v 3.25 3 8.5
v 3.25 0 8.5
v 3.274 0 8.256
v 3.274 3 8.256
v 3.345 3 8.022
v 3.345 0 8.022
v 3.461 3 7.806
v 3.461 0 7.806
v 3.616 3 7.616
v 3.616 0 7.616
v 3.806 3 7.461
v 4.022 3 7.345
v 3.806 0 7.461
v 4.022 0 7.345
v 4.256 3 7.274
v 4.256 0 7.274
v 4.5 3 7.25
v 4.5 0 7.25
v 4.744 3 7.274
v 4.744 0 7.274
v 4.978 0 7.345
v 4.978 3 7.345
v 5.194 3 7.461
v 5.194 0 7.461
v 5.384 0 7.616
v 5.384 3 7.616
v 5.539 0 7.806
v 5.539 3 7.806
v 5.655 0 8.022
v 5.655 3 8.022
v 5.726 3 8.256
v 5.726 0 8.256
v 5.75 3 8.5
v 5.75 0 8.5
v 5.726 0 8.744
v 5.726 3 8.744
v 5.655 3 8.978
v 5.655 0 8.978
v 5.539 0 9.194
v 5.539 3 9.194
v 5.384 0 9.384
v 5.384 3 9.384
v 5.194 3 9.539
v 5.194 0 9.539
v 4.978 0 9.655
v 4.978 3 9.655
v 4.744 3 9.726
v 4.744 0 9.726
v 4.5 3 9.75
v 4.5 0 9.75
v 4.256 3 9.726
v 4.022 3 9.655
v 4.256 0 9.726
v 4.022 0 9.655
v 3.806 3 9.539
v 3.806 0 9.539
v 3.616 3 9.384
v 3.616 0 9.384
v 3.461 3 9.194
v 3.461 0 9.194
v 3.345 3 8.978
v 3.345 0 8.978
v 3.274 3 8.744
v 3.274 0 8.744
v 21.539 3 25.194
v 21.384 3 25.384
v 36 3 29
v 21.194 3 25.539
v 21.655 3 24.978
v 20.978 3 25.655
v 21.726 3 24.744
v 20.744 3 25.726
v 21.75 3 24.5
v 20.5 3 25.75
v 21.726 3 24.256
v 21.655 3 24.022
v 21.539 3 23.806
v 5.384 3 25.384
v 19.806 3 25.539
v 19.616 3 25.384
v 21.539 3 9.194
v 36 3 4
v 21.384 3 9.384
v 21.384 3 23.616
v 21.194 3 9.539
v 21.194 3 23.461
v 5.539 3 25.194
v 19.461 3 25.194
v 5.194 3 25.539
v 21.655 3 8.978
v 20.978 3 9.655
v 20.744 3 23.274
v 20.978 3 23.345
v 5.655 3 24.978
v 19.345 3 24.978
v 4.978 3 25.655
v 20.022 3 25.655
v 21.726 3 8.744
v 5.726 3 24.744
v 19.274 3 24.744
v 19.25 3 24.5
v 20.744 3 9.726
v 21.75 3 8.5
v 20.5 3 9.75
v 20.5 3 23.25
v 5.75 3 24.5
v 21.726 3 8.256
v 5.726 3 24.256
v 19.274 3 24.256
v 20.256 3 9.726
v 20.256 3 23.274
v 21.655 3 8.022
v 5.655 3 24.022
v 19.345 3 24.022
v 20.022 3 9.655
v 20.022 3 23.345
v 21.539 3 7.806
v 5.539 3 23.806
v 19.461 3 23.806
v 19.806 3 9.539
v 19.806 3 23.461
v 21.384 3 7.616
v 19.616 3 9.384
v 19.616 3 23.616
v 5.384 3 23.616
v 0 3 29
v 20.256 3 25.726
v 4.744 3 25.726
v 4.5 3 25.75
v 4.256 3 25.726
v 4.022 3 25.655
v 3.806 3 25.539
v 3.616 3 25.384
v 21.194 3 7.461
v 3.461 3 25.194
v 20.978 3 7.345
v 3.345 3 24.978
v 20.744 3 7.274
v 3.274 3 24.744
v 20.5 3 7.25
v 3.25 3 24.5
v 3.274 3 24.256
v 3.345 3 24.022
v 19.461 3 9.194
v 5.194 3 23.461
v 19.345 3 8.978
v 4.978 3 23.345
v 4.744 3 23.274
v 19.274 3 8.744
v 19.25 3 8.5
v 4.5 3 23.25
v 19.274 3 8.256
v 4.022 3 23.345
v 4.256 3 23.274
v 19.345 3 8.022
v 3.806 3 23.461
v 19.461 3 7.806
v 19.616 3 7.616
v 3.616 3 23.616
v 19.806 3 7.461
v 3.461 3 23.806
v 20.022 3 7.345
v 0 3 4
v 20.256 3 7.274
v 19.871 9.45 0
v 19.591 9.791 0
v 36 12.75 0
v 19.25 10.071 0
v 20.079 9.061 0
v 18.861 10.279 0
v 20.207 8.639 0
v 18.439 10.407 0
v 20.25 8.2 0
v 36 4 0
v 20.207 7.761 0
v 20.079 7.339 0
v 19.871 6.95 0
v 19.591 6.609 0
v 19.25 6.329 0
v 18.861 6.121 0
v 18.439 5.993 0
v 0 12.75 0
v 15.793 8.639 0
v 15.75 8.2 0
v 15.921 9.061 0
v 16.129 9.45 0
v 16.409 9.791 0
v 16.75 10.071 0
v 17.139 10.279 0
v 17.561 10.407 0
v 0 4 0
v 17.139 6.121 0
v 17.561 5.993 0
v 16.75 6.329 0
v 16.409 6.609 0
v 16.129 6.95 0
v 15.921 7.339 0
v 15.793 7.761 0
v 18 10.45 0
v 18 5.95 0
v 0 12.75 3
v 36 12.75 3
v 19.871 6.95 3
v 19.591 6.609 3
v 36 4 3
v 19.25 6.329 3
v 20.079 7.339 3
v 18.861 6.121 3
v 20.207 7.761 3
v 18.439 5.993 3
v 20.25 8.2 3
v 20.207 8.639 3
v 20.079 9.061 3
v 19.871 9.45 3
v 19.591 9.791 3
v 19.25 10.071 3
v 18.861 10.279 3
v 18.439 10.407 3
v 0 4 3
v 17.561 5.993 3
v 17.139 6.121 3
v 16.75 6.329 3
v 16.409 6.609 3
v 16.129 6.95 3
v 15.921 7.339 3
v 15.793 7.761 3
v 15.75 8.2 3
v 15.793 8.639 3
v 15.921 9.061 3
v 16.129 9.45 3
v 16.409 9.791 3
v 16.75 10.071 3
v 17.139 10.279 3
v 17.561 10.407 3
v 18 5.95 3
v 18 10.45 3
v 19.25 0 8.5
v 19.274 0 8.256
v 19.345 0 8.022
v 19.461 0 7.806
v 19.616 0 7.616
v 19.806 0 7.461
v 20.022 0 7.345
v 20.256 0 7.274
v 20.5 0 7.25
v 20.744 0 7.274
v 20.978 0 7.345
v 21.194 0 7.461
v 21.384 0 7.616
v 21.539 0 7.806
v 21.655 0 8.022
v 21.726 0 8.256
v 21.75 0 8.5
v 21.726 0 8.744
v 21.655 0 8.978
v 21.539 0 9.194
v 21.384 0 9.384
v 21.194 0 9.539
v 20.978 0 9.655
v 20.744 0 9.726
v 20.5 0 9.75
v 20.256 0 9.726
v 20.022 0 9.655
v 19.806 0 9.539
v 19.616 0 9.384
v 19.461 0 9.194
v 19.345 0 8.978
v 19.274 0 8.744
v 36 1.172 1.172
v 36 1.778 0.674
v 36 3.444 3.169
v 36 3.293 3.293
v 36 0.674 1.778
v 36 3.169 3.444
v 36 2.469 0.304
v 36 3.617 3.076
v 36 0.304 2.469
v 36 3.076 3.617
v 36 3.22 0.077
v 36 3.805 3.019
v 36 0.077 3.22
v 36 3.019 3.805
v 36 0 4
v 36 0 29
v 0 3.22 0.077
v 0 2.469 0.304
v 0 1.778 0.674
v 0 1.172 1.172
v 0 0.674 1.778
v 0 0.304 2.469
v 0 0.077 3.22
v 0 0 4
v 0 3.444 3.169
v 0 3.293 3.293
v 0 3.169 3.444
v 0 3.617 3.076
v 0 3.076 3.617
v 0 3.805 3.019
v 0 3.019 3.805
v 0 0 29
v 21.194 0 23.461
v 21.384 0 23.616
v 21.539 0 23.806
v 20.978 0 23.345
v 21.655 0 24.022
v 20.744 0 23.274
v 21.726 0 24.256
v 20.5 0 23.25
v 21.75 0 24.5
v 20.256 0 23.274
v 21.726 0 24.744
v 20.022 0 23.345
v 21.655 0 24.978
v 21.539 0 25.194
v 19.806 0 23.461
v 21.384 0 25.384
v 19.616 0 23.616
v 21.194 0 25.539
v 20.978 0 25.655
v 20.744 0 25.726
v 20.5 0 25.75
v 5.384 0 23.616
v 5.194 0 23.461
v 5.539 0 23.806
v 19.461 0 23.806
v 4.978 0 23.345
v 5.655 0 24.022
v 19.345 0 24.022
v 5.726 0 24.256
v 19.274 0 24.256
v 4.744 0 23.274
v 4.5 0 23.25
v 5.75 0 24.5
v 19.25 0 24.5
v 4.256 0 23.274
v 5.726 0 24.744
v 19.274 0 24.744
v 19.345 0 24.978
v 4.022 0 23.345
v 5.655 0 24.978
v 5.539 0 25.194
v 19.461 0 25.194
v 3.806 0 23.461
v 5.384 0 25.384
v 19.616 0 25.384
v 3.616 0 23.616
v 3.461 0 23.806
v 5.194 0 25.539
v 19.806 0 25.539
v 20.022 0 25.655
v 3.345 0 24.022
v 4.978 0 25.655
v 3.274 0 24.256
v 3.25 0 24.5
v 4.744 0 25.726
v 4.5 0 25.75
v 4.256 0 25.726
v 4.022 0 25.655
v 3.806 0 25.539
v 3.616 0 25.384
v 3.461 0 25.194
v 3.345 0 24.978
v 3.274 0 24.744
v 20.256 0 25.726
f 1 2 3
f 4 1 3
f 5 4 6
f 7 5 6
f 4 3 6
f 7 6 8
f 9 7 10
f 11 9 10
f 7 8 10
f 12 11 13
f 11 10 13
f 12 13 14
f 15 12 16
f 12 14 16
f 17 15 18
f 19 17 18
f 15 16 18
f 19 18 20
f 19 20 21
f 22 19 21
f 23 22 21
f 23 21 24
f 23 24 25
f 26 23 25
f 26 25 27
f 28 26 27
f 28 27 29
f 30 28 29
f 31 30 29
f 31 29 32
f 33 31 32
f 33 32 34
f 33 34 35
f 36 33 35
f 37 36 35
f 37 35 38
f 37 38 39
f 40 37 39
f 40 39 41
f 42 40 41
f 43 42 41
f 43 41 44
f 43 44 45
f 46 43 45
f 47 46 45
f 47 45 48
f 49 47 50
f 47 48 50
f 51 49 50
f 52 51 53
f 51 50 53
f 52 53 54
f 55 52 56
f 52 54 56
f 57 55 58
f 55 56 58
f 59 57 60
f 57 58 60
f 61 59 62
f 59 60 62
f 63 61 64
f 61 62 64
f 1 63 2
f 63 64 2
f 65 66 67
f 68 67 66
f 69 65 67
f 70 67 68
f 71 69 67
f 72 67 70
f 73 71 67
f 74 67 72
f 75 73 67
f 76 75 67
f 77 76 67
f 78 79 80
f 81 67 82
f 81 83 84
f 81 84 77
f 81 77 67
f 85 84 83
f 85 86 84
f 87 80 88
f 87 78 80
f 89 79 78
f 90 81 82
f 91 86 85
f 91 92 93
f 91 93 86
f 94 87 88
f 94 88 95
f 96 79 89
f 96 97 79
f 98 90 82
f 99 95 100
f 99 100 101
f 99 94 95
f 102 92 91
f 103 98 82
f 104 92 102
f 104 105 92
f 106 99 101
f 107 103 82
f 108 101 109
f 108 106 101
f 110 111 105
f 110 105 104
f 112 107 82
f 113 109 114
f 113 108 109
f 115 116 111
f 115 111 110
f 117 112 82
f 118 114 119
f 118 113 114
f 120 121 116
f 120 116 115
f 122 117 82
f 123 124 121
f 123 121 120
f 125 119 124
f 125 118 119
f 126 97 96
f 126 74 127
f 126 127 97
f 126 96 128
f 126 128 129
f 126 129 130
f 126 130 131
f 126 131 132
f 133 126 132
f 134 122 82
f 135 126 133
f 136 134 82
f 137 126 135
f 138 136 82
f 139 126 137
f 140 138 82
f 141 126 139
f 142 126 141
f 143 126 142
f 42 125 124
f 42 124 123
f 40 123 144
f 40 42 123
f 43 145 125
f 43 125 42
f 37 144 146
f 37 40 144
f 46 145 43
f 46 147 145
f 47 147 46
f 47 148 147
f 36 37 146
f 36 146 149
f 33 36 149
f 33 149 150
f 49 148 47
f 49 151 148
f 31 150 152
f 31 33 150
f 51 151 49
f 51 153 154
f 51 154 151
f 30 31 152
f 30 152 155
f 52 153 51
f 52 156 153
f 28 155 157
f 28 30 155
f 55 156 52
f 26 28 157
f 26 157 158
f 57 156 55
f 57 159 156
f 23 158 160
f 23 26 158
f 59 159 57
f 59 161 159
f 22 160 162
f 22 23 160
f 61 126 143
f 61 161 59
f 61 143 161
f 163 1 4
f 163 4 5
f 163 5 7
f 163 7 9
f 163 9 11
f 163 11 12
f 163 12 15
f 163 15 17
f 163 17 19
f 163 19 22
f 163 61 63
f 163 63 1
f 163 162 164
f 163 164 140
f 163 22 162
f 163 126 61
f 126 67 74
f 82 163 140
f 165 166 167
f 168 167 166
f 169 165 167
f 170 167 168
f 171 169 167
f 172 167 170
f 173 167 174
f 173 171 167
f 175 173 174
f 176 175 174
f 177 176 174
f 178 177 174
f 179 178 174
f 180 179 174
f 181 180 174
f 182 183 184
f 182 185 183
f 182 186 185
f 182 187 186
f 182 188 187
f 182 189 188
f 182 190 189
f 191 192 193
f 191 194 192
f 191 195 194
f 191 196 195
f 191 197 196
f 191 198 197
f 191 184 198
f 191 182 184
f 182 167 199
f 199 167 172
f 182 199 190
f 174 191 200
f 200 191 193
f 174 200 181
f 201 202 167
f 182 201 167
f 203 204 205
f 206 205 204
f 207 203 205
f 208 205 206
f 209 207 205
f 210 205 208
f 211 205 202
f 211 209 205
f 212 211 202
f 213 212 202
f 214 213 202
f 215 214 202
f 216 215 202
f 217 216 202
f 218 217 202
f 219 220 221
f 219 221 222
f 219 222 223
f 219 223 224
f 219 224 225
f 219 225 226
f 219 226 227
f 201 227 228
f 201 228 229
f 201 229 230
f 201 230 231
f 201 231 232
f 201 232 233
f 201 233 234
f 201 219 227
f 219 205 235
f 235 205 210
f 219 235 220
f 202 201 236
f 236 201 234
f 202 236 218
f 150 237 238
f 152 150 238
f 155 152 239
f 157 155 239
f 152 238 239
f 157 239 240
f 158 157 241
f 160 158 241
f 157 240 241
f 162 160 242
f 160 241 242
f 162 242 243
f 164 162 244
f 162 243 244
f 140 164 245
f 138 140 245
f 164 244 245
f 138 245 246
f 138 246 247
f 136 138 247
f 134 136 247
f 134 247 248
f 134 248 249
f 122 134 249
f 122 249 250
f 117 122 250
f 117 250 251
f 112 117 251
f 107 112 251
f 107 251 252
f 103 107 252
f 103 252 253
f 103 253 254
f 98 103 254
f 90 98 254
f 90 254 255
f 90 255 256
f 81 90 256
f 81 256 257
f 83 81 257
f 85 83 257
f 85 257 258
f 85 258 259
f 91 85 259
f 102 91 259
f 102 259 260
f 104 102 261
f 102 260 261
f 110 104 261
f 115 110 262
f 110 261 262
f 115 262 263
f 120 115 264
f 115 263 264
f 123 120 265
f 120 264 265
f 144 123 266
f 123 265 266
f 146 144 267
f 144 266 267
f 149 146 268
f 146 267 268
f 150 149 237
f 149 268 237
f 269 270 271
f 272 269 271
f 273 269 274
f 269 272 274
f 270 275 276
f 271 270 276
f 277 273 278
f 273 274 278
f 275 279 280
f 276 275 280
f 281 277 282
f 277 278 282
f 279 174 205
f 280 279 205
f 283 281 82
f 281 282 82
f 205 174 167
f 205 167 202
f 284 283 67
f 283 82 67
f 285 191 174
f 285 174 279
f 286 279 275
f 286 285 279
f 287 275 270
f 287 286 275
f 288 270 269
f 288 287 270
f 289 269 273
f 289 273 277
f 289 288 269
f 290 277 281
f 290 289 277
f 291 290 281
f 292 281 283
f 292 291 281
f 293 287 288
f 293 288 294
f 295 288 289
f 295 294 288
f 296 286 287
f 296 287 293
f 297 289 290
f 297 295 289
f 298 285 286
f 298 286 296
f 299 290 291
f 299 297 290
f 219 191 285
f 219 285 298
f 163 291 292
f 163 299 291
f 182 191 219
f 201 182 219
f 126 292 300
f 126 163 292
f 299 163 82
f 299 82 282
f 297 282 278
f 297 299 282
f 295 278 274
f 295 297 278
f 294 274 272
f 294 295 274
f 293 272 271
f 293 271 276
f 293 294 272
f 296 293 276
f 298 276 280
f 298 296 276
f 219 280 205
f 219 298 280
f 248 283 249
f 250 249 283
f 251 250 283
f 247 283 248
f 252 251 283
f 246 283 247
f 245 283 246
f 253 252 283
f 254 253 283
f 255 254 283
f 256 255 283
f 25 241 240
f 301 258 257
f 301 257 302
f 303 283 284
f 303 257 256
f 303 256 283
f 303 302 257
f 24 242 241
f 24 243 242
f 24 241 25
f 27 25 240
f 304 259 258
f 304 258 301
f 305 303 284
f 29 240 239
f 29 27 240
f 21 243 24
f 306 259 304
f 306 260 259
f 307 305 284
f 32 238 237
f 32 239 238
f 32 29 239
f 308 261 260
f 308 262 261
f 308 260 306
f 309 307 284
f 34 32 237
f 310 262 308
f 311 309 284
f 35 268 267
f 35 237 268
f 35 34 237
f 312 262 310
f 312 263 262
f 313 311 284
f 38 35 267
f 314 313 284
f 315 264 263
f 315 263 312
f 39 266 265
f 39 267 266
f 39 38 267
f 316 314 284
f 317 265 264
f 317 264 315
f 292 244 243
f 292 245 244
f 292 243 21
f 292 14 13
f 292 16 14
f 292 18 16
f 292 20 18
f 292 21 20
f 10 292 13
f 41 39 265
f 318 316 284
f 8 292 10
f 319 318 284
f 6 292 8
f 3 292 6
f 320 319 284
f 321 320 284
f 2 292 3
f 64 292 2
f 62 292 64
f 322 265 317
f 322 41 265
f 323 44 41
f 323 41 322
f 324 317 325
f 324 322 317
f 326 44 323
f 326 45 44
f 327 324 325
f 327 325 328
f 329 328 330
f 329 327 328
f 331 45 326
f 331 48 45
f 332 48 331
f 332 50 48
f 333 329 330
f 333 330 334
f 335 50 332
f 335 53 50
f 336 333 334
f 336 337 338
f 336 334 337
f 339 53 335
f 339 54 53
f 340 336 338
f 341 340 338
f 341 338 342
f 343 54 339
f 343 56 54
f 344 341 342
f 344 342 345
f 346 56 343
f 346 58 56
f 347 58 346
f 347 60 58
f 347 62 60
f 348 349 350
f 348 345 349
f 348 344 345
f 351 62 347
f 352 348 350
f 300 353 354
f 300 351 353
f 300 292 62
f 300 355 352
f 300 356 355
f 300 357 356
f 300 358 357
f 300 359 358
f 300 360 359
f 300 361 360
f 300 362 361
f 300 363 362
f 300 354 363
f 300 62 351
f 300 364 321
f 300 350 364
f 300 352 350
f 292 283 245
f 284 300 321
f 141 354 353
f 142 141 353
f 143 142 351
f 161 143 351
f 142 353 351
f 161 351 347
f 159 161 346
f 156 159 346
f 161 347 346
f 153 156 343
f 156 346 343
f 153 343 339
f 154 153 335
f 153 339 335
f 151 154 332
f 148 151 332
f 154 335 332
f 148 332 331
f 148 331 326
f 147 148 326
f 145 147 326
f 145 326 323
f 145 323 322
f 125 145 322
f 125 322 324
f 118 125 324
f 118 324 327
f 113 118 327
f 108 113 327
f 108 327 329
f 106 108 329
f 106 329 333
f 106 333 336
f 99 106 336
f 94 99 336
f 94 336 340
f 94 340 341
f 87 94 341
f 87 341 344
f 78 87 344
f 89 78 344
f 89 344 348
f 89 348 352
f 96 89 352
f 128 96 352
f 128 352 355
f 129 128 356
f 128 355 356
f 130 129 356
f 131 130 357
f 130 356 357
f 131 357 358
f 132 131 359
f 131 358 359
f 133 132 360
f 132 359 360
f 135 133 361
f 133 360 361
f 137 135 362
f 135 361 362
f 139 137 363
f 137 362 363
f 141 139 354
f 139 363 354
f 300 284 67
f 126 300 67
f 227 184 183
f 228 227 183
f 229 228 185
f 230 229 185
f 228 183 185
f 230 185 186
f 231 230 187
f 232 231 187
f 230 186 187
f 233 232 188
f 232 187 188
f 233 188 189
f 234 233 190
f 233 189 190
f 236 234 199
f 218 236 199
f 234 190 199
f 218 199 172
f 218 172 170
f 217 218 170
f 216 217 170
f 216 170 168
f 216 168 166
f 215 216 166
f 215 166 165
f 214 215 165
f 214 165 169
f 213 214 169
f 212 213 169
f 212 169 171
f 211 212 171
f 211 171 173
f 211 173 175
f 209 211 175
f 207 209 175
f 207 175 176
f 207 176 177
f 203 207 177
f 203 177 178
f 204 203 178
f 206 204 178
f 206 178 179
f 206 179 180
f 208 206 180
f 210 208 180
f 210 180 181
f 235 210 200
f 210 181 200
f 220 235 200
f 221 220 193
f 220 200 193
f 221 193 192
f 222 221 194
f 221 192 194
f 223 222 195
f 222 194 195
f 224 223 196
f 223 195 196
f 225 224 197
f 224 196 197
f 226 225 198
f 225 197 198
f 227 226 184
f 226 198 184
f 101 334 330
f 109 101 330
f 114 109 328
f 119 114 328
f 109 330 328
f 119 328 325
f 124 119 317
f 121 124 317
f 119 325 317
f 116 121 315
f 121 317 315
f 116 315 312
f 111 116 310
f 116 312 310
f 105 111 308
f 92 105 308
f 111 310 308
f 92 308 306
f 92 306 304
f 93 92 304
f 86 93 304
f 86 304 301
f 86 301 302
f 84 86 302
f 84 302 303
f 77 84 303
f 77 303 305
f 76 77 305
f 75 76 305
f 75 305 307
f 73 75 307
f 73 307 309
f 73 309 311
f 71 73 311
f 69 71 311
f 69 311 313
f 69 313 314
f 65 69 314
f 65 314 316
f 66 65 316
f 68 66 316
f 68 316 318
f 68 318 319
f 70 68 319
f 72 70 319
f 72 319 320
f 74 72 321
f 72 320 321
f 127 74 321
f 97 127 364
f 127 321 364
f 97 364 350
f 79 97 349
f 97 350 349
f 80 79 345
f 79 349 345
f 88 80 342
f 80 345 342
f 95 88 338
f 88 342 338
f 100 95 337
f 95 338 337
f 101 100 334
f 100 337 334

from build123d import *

# Parameters (mm, degrees)
T_LE_DE_BASE_PLI_E1_DEPTH = 36
TROU_TARAUD_M31_D         = 2.5
D_GAGEMENT_M41_D          = 4.5


# Sheet-metal steps are written as plain solids
with BuildPart() as part:
    # Tôle de base pliée1: sheet metal written as solids
    # Esquisse1 → Tôle de base pliée1 (new body)
    with BuildSketch(Plane(origin=(0, 0, 0), x_dir=(0, 0, -1), z_dir=(1, 0, 0))):
        with BuildLine():
            Line((0, 12.75), (0, 4))
            ThreePointArc((0, 4), (-1.171572875, 1.171572875), (-4, 0))
            Line((-4, 0), (-29, 0))
            Line((-29, 0), (-29, 3))
            Line((-29, 3), (-4, 3))
            ThreePointArc((-4, 3), (-3.292893219, 3.292893219), (-3, 4))
            Line((-3, 4), (-3, 12.75))
            Line((-3, 12.75), (0, 12.75))
        make_face()
    extrude(amount=T_LE_DE_BASE_PLI_E1_DEPTH)

    # Trou taraudé M31 (through all)
    with Locations(Plane(origin=(0, 3, 0), x_dir=(1, 0, 0), z_dir=(0, 1, 0))):
        with Locations((4.5, -24.5), (4.5, -8.5), (20.5, -8.5), (20.5, -24.5)):
            Hole(TROU_TARAUD_M31_D / 2)

    # Dégagement M41 (through all)
    with Locations(Plane.XY.offset(3)):
        with Locations((18, 8.2)):
            Hole(D_GAGEMENT_M41_D / 2)


solid = part.part
